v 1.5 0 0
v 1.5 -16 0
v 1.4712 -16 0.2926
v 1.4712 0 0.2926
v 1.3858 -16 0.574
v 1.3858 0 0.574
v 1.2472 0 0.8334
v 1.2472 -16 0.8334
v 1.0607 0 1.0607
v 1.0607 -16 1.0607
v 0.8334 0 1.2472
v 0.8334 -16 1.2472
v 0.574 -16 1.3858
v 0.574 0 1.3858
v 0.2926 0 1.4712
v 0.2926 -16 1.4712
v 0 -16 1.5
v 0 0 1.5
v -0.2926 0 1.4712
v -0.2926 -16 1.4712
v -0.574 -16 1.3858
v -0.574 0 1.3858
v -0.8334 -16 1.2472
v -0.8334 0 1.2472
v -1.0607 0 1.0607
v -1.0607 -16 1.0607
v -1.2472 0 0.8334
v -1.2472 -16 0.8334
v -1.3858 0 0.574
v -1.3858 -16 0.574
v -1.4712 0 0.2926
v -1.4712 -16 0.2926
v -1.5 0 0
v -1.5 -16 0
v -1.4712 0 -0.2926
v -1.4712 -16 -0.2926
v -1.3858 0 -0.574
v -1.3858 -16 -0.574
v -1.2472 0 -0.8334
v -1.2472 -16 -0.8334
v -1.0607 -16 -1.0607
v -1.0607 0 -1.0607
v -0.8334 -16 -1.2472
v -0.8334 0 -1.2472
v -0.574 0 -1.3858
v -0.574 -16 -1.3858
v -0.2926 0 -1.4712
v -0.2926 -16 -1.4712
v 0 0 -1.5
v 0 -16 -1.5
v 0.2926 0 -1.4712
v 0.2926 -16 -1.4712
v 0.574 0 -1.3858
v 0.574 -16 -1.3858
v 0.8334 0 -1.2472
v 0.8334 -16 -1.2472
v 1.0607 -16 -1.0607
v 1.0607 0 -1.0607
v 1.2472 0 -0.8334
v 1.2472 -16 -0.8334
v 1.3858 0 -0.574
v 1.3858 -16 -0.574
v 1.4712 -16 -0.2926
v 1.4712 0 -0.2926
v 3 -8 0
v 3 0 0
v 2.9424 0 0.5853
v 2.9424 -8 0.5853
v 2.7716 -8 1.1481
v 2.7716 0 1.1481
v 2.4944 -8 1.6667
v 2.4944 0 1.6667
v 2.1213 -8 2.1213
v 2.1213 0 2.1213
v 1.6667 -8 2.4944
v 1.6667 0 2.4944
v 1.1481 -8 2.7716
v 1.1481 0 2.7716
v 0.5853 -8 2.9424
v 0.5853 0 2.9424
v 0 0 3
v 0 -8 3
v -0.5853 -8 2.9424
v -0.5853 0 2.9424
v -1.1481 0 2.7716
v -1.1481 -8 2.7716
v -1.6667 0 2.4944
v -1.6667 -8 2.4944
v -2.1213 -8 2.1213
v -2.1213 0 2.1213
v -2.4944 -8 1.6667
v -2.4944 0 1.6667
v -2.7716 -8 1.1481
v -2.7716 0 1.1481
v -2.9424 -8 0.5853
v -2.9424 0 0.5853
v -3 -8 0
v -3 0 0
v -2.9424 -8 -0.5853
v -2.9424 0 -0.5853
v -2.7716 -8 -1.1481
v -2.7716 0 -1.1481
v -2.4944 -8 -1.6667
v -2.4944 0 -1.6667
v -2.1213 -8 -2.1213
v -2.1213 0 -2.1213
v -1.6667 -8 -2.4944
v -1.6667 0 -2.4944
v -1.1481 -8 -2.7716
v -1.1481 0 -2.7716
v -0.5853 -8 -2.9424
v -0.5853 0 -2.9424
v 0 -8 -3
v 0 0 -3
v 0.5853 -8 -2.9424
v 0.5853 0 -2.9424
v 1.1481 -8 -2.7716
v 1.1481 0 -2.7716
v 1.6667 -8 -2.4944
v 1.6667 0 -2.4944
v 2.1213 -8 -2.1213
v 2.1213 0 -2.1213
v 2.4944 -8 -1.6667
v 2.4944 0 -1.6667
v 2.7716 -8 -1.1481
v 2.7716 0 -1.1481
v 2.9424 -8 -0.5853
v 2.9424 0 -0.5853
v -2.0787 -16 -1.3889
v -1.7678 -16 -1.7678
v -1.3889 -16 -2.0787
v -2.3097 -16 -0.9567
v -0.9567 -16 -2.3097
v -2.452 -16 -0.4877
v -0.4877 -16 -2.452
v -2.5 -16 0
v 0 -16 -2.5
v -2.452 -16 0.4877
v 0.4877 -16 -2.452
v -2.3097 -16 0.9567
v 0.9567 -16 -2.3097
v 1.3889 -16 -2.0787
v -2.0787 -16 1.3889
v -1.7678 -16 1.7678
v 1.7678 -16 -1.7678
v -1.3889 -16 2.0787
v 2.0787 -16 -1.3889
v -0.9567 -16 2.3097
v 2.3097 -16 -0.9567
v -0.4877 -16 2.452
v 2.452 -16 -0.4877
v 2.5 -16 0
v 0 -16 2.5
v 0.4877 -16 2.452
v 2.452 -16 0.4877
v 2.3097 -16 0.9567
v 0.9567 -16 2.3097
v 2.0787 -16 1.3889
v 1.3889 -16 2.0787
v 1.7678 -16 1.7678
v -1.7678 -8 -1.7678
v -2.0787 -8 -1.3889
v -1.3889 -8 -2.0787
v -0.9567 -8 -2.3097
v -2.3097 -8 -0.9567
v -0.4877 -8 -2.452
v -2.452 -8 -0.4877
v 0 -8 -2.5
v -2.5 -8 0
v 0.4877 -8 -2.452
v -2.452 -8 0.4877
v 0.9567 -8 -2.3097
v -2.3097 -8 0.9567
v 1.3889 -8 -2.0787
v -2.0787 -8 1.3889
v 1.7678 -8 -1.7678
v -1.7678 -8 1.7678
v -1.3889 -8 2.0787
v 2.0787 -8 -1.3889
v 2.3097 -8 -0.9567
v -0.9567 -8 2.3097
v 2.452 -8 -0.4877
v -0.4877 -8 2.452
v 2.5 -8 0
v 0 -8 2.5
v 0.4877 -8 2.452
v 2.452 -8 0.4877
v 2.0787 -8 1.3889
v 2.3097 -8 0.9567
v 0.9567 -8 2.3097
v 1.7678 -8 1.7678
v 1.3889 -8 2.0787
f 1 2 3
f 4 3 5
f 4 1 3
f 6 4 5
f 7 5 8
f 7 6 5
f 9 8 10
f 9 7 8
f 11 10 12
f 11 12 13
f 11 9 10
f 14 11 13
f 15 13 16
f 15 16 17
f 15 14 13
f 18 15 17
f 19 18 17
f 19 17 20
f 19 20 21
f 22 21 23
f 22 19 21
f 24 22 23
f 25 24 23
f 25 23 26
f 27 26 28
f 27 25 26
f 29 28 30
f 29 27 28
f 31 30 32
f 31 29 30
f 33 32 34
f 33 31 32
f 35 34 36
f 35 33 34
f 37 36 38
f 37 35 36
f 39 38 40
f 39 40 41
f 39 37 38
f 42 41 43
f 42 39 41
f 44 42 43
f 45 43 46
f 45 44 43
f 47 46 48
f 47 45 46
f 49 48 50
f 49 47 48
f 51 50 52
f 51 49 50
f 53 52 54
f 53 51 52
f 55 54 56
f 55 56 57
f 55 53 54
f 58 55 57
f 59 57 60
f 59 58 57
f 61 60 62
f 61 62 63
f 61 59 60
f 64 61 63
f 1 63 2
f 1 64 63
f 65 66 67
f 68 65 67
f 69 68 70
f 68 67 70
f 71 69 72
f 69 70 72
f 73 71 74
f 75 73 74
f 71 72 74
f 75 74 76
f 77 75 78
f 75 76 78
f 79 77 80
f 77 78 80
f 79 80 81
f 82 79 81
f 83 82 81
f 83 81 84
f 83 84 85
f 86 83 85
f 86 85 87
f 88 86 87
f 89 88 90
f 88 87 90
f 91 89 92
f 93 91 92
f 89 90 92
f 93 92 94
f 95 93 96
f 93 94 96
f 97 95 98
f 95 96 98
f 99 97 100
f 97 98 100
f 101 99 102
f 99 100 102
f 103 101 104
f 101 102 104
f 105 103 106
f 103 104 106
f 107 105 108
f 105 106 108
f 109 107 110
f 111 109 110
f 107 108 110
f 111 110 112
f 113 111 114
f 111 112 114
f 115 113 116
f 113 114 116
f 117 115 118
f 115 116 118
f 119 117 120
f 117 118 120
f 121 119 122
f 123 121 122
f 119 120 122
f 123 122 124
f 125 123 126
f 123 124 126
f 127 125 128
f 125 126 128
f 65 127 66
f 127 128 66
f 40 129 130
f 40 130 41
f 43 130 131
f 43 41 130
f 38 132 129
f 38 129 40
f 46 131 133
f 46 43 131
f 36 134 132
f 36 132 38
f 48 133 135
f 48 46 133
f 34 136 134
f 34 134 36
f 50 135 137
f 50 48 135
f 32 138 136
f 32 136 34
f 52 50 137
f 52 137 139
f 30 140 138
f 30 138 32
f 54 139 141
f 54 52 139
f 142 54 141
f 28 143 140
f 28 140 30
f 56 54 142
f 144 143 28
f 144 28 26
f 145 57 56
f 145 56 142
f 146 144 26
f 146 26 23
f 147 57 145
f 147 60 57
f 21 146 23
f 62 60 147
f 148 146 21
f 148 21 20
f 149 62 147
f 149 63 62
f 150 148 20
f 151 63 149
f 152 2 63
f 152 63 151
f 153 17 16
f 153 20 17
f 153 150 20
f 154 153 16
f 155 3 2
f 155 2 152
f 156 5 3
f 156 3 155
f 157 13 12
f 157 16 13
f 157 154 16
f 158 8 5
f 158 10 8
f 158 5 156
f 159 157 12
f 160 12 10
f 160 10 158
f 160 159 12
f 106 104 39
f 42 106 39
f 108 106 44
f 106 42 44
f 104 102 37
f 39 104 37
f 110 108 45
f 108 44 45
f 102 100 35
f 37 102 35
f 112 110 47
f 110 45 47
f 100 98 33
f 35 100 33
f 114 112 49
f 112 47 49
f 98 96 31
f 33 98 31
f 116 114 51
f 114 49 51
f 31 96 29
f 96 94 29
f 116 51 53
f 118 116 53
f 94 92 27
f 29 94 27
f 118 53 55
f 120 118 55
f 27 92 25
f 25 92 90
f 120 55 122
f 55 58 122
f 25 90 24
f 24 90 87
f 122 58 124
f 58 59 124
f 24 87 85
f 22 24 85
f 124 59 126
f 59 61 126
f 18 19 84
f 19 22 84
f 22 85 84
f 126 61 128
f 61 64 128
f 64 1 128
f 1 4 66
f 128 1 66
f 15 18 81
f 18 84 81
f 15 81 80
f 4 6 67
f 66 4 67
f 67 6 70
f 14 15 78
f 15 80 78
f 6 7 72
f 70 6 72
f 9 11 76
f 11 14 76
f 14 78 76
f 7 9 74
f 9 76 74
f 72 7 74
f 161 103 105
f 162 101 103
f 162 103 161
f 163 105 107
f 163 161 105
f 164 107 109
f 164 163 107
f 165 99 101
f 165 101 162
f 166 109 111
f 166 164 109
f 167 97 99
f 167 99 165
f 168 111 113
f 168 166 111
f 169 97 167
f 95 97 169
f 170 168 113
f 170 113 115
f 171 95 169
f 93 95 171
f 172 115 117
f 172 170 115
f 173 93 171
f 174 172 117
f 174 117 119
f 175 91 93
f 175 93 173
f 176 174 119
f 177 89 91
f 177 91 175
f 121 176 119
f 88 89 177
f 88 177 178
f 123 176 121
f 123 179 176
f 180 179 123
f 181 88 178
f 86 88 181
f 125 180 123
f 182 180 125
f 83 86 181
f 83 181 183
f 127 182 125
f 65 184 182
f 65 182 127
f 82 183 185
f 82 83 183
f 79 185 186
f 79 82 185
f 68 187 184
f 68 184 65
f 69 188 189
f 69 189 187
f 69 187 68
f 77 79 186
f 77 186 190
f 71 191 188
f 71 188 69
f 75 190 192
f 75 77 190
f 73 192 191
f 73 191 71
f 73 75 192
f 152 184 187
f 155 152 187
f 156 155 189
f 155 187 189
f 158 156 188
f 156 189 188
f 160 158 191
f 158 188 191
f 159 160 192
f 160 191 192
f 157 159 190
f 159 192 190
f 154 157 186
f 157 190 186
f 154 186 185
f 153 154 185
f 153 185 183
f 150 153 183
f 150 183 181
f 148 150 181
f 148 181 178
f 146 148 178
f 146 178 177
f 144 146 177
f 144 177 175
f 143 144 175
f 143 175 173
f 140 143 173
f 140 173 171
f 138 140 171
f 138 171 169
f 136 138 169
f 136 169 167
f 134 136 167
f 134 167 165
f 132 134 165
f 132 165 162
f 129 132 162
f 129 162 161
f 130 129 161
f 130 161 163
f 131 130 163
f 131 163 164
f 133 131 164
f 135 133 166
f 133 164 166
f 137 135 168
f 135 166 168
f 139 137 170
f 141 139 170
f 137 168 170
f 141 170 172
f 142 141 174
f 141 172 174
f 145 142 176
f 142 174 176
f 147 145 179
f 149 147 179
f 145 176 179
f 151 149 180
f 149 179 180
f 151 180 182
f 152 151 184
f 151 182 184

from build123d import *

# Parameters (mm, degrees)
F0_R     = 3
F1_DEPTH = 8
F2_R     = 2.5
F3_DEPTH = 16
F4_R     = 1.5
F5_DEPTH = 16


with BuildPart() as f1:
    # F0 (on Front) → F1 (new body)
    with BuildSketch(Plane.XZ):
        Circle(F0_R)
    extrude(amount=F1_DEPTH)

    # F2 (on Front) → F3 (join)
    with BuildSketch(Plane.XZ):
        Circle(F2_R)
    extrude(amount=F3_DEPTH)

    # F4 (on Front) → F5 (cut)
    with BuildSketch(Plane.XZ):
        Circle(F4_R)
    extrude(amount=F5_DEPTH, mode=Mode.SUBTRACT)


solid = f1.part
